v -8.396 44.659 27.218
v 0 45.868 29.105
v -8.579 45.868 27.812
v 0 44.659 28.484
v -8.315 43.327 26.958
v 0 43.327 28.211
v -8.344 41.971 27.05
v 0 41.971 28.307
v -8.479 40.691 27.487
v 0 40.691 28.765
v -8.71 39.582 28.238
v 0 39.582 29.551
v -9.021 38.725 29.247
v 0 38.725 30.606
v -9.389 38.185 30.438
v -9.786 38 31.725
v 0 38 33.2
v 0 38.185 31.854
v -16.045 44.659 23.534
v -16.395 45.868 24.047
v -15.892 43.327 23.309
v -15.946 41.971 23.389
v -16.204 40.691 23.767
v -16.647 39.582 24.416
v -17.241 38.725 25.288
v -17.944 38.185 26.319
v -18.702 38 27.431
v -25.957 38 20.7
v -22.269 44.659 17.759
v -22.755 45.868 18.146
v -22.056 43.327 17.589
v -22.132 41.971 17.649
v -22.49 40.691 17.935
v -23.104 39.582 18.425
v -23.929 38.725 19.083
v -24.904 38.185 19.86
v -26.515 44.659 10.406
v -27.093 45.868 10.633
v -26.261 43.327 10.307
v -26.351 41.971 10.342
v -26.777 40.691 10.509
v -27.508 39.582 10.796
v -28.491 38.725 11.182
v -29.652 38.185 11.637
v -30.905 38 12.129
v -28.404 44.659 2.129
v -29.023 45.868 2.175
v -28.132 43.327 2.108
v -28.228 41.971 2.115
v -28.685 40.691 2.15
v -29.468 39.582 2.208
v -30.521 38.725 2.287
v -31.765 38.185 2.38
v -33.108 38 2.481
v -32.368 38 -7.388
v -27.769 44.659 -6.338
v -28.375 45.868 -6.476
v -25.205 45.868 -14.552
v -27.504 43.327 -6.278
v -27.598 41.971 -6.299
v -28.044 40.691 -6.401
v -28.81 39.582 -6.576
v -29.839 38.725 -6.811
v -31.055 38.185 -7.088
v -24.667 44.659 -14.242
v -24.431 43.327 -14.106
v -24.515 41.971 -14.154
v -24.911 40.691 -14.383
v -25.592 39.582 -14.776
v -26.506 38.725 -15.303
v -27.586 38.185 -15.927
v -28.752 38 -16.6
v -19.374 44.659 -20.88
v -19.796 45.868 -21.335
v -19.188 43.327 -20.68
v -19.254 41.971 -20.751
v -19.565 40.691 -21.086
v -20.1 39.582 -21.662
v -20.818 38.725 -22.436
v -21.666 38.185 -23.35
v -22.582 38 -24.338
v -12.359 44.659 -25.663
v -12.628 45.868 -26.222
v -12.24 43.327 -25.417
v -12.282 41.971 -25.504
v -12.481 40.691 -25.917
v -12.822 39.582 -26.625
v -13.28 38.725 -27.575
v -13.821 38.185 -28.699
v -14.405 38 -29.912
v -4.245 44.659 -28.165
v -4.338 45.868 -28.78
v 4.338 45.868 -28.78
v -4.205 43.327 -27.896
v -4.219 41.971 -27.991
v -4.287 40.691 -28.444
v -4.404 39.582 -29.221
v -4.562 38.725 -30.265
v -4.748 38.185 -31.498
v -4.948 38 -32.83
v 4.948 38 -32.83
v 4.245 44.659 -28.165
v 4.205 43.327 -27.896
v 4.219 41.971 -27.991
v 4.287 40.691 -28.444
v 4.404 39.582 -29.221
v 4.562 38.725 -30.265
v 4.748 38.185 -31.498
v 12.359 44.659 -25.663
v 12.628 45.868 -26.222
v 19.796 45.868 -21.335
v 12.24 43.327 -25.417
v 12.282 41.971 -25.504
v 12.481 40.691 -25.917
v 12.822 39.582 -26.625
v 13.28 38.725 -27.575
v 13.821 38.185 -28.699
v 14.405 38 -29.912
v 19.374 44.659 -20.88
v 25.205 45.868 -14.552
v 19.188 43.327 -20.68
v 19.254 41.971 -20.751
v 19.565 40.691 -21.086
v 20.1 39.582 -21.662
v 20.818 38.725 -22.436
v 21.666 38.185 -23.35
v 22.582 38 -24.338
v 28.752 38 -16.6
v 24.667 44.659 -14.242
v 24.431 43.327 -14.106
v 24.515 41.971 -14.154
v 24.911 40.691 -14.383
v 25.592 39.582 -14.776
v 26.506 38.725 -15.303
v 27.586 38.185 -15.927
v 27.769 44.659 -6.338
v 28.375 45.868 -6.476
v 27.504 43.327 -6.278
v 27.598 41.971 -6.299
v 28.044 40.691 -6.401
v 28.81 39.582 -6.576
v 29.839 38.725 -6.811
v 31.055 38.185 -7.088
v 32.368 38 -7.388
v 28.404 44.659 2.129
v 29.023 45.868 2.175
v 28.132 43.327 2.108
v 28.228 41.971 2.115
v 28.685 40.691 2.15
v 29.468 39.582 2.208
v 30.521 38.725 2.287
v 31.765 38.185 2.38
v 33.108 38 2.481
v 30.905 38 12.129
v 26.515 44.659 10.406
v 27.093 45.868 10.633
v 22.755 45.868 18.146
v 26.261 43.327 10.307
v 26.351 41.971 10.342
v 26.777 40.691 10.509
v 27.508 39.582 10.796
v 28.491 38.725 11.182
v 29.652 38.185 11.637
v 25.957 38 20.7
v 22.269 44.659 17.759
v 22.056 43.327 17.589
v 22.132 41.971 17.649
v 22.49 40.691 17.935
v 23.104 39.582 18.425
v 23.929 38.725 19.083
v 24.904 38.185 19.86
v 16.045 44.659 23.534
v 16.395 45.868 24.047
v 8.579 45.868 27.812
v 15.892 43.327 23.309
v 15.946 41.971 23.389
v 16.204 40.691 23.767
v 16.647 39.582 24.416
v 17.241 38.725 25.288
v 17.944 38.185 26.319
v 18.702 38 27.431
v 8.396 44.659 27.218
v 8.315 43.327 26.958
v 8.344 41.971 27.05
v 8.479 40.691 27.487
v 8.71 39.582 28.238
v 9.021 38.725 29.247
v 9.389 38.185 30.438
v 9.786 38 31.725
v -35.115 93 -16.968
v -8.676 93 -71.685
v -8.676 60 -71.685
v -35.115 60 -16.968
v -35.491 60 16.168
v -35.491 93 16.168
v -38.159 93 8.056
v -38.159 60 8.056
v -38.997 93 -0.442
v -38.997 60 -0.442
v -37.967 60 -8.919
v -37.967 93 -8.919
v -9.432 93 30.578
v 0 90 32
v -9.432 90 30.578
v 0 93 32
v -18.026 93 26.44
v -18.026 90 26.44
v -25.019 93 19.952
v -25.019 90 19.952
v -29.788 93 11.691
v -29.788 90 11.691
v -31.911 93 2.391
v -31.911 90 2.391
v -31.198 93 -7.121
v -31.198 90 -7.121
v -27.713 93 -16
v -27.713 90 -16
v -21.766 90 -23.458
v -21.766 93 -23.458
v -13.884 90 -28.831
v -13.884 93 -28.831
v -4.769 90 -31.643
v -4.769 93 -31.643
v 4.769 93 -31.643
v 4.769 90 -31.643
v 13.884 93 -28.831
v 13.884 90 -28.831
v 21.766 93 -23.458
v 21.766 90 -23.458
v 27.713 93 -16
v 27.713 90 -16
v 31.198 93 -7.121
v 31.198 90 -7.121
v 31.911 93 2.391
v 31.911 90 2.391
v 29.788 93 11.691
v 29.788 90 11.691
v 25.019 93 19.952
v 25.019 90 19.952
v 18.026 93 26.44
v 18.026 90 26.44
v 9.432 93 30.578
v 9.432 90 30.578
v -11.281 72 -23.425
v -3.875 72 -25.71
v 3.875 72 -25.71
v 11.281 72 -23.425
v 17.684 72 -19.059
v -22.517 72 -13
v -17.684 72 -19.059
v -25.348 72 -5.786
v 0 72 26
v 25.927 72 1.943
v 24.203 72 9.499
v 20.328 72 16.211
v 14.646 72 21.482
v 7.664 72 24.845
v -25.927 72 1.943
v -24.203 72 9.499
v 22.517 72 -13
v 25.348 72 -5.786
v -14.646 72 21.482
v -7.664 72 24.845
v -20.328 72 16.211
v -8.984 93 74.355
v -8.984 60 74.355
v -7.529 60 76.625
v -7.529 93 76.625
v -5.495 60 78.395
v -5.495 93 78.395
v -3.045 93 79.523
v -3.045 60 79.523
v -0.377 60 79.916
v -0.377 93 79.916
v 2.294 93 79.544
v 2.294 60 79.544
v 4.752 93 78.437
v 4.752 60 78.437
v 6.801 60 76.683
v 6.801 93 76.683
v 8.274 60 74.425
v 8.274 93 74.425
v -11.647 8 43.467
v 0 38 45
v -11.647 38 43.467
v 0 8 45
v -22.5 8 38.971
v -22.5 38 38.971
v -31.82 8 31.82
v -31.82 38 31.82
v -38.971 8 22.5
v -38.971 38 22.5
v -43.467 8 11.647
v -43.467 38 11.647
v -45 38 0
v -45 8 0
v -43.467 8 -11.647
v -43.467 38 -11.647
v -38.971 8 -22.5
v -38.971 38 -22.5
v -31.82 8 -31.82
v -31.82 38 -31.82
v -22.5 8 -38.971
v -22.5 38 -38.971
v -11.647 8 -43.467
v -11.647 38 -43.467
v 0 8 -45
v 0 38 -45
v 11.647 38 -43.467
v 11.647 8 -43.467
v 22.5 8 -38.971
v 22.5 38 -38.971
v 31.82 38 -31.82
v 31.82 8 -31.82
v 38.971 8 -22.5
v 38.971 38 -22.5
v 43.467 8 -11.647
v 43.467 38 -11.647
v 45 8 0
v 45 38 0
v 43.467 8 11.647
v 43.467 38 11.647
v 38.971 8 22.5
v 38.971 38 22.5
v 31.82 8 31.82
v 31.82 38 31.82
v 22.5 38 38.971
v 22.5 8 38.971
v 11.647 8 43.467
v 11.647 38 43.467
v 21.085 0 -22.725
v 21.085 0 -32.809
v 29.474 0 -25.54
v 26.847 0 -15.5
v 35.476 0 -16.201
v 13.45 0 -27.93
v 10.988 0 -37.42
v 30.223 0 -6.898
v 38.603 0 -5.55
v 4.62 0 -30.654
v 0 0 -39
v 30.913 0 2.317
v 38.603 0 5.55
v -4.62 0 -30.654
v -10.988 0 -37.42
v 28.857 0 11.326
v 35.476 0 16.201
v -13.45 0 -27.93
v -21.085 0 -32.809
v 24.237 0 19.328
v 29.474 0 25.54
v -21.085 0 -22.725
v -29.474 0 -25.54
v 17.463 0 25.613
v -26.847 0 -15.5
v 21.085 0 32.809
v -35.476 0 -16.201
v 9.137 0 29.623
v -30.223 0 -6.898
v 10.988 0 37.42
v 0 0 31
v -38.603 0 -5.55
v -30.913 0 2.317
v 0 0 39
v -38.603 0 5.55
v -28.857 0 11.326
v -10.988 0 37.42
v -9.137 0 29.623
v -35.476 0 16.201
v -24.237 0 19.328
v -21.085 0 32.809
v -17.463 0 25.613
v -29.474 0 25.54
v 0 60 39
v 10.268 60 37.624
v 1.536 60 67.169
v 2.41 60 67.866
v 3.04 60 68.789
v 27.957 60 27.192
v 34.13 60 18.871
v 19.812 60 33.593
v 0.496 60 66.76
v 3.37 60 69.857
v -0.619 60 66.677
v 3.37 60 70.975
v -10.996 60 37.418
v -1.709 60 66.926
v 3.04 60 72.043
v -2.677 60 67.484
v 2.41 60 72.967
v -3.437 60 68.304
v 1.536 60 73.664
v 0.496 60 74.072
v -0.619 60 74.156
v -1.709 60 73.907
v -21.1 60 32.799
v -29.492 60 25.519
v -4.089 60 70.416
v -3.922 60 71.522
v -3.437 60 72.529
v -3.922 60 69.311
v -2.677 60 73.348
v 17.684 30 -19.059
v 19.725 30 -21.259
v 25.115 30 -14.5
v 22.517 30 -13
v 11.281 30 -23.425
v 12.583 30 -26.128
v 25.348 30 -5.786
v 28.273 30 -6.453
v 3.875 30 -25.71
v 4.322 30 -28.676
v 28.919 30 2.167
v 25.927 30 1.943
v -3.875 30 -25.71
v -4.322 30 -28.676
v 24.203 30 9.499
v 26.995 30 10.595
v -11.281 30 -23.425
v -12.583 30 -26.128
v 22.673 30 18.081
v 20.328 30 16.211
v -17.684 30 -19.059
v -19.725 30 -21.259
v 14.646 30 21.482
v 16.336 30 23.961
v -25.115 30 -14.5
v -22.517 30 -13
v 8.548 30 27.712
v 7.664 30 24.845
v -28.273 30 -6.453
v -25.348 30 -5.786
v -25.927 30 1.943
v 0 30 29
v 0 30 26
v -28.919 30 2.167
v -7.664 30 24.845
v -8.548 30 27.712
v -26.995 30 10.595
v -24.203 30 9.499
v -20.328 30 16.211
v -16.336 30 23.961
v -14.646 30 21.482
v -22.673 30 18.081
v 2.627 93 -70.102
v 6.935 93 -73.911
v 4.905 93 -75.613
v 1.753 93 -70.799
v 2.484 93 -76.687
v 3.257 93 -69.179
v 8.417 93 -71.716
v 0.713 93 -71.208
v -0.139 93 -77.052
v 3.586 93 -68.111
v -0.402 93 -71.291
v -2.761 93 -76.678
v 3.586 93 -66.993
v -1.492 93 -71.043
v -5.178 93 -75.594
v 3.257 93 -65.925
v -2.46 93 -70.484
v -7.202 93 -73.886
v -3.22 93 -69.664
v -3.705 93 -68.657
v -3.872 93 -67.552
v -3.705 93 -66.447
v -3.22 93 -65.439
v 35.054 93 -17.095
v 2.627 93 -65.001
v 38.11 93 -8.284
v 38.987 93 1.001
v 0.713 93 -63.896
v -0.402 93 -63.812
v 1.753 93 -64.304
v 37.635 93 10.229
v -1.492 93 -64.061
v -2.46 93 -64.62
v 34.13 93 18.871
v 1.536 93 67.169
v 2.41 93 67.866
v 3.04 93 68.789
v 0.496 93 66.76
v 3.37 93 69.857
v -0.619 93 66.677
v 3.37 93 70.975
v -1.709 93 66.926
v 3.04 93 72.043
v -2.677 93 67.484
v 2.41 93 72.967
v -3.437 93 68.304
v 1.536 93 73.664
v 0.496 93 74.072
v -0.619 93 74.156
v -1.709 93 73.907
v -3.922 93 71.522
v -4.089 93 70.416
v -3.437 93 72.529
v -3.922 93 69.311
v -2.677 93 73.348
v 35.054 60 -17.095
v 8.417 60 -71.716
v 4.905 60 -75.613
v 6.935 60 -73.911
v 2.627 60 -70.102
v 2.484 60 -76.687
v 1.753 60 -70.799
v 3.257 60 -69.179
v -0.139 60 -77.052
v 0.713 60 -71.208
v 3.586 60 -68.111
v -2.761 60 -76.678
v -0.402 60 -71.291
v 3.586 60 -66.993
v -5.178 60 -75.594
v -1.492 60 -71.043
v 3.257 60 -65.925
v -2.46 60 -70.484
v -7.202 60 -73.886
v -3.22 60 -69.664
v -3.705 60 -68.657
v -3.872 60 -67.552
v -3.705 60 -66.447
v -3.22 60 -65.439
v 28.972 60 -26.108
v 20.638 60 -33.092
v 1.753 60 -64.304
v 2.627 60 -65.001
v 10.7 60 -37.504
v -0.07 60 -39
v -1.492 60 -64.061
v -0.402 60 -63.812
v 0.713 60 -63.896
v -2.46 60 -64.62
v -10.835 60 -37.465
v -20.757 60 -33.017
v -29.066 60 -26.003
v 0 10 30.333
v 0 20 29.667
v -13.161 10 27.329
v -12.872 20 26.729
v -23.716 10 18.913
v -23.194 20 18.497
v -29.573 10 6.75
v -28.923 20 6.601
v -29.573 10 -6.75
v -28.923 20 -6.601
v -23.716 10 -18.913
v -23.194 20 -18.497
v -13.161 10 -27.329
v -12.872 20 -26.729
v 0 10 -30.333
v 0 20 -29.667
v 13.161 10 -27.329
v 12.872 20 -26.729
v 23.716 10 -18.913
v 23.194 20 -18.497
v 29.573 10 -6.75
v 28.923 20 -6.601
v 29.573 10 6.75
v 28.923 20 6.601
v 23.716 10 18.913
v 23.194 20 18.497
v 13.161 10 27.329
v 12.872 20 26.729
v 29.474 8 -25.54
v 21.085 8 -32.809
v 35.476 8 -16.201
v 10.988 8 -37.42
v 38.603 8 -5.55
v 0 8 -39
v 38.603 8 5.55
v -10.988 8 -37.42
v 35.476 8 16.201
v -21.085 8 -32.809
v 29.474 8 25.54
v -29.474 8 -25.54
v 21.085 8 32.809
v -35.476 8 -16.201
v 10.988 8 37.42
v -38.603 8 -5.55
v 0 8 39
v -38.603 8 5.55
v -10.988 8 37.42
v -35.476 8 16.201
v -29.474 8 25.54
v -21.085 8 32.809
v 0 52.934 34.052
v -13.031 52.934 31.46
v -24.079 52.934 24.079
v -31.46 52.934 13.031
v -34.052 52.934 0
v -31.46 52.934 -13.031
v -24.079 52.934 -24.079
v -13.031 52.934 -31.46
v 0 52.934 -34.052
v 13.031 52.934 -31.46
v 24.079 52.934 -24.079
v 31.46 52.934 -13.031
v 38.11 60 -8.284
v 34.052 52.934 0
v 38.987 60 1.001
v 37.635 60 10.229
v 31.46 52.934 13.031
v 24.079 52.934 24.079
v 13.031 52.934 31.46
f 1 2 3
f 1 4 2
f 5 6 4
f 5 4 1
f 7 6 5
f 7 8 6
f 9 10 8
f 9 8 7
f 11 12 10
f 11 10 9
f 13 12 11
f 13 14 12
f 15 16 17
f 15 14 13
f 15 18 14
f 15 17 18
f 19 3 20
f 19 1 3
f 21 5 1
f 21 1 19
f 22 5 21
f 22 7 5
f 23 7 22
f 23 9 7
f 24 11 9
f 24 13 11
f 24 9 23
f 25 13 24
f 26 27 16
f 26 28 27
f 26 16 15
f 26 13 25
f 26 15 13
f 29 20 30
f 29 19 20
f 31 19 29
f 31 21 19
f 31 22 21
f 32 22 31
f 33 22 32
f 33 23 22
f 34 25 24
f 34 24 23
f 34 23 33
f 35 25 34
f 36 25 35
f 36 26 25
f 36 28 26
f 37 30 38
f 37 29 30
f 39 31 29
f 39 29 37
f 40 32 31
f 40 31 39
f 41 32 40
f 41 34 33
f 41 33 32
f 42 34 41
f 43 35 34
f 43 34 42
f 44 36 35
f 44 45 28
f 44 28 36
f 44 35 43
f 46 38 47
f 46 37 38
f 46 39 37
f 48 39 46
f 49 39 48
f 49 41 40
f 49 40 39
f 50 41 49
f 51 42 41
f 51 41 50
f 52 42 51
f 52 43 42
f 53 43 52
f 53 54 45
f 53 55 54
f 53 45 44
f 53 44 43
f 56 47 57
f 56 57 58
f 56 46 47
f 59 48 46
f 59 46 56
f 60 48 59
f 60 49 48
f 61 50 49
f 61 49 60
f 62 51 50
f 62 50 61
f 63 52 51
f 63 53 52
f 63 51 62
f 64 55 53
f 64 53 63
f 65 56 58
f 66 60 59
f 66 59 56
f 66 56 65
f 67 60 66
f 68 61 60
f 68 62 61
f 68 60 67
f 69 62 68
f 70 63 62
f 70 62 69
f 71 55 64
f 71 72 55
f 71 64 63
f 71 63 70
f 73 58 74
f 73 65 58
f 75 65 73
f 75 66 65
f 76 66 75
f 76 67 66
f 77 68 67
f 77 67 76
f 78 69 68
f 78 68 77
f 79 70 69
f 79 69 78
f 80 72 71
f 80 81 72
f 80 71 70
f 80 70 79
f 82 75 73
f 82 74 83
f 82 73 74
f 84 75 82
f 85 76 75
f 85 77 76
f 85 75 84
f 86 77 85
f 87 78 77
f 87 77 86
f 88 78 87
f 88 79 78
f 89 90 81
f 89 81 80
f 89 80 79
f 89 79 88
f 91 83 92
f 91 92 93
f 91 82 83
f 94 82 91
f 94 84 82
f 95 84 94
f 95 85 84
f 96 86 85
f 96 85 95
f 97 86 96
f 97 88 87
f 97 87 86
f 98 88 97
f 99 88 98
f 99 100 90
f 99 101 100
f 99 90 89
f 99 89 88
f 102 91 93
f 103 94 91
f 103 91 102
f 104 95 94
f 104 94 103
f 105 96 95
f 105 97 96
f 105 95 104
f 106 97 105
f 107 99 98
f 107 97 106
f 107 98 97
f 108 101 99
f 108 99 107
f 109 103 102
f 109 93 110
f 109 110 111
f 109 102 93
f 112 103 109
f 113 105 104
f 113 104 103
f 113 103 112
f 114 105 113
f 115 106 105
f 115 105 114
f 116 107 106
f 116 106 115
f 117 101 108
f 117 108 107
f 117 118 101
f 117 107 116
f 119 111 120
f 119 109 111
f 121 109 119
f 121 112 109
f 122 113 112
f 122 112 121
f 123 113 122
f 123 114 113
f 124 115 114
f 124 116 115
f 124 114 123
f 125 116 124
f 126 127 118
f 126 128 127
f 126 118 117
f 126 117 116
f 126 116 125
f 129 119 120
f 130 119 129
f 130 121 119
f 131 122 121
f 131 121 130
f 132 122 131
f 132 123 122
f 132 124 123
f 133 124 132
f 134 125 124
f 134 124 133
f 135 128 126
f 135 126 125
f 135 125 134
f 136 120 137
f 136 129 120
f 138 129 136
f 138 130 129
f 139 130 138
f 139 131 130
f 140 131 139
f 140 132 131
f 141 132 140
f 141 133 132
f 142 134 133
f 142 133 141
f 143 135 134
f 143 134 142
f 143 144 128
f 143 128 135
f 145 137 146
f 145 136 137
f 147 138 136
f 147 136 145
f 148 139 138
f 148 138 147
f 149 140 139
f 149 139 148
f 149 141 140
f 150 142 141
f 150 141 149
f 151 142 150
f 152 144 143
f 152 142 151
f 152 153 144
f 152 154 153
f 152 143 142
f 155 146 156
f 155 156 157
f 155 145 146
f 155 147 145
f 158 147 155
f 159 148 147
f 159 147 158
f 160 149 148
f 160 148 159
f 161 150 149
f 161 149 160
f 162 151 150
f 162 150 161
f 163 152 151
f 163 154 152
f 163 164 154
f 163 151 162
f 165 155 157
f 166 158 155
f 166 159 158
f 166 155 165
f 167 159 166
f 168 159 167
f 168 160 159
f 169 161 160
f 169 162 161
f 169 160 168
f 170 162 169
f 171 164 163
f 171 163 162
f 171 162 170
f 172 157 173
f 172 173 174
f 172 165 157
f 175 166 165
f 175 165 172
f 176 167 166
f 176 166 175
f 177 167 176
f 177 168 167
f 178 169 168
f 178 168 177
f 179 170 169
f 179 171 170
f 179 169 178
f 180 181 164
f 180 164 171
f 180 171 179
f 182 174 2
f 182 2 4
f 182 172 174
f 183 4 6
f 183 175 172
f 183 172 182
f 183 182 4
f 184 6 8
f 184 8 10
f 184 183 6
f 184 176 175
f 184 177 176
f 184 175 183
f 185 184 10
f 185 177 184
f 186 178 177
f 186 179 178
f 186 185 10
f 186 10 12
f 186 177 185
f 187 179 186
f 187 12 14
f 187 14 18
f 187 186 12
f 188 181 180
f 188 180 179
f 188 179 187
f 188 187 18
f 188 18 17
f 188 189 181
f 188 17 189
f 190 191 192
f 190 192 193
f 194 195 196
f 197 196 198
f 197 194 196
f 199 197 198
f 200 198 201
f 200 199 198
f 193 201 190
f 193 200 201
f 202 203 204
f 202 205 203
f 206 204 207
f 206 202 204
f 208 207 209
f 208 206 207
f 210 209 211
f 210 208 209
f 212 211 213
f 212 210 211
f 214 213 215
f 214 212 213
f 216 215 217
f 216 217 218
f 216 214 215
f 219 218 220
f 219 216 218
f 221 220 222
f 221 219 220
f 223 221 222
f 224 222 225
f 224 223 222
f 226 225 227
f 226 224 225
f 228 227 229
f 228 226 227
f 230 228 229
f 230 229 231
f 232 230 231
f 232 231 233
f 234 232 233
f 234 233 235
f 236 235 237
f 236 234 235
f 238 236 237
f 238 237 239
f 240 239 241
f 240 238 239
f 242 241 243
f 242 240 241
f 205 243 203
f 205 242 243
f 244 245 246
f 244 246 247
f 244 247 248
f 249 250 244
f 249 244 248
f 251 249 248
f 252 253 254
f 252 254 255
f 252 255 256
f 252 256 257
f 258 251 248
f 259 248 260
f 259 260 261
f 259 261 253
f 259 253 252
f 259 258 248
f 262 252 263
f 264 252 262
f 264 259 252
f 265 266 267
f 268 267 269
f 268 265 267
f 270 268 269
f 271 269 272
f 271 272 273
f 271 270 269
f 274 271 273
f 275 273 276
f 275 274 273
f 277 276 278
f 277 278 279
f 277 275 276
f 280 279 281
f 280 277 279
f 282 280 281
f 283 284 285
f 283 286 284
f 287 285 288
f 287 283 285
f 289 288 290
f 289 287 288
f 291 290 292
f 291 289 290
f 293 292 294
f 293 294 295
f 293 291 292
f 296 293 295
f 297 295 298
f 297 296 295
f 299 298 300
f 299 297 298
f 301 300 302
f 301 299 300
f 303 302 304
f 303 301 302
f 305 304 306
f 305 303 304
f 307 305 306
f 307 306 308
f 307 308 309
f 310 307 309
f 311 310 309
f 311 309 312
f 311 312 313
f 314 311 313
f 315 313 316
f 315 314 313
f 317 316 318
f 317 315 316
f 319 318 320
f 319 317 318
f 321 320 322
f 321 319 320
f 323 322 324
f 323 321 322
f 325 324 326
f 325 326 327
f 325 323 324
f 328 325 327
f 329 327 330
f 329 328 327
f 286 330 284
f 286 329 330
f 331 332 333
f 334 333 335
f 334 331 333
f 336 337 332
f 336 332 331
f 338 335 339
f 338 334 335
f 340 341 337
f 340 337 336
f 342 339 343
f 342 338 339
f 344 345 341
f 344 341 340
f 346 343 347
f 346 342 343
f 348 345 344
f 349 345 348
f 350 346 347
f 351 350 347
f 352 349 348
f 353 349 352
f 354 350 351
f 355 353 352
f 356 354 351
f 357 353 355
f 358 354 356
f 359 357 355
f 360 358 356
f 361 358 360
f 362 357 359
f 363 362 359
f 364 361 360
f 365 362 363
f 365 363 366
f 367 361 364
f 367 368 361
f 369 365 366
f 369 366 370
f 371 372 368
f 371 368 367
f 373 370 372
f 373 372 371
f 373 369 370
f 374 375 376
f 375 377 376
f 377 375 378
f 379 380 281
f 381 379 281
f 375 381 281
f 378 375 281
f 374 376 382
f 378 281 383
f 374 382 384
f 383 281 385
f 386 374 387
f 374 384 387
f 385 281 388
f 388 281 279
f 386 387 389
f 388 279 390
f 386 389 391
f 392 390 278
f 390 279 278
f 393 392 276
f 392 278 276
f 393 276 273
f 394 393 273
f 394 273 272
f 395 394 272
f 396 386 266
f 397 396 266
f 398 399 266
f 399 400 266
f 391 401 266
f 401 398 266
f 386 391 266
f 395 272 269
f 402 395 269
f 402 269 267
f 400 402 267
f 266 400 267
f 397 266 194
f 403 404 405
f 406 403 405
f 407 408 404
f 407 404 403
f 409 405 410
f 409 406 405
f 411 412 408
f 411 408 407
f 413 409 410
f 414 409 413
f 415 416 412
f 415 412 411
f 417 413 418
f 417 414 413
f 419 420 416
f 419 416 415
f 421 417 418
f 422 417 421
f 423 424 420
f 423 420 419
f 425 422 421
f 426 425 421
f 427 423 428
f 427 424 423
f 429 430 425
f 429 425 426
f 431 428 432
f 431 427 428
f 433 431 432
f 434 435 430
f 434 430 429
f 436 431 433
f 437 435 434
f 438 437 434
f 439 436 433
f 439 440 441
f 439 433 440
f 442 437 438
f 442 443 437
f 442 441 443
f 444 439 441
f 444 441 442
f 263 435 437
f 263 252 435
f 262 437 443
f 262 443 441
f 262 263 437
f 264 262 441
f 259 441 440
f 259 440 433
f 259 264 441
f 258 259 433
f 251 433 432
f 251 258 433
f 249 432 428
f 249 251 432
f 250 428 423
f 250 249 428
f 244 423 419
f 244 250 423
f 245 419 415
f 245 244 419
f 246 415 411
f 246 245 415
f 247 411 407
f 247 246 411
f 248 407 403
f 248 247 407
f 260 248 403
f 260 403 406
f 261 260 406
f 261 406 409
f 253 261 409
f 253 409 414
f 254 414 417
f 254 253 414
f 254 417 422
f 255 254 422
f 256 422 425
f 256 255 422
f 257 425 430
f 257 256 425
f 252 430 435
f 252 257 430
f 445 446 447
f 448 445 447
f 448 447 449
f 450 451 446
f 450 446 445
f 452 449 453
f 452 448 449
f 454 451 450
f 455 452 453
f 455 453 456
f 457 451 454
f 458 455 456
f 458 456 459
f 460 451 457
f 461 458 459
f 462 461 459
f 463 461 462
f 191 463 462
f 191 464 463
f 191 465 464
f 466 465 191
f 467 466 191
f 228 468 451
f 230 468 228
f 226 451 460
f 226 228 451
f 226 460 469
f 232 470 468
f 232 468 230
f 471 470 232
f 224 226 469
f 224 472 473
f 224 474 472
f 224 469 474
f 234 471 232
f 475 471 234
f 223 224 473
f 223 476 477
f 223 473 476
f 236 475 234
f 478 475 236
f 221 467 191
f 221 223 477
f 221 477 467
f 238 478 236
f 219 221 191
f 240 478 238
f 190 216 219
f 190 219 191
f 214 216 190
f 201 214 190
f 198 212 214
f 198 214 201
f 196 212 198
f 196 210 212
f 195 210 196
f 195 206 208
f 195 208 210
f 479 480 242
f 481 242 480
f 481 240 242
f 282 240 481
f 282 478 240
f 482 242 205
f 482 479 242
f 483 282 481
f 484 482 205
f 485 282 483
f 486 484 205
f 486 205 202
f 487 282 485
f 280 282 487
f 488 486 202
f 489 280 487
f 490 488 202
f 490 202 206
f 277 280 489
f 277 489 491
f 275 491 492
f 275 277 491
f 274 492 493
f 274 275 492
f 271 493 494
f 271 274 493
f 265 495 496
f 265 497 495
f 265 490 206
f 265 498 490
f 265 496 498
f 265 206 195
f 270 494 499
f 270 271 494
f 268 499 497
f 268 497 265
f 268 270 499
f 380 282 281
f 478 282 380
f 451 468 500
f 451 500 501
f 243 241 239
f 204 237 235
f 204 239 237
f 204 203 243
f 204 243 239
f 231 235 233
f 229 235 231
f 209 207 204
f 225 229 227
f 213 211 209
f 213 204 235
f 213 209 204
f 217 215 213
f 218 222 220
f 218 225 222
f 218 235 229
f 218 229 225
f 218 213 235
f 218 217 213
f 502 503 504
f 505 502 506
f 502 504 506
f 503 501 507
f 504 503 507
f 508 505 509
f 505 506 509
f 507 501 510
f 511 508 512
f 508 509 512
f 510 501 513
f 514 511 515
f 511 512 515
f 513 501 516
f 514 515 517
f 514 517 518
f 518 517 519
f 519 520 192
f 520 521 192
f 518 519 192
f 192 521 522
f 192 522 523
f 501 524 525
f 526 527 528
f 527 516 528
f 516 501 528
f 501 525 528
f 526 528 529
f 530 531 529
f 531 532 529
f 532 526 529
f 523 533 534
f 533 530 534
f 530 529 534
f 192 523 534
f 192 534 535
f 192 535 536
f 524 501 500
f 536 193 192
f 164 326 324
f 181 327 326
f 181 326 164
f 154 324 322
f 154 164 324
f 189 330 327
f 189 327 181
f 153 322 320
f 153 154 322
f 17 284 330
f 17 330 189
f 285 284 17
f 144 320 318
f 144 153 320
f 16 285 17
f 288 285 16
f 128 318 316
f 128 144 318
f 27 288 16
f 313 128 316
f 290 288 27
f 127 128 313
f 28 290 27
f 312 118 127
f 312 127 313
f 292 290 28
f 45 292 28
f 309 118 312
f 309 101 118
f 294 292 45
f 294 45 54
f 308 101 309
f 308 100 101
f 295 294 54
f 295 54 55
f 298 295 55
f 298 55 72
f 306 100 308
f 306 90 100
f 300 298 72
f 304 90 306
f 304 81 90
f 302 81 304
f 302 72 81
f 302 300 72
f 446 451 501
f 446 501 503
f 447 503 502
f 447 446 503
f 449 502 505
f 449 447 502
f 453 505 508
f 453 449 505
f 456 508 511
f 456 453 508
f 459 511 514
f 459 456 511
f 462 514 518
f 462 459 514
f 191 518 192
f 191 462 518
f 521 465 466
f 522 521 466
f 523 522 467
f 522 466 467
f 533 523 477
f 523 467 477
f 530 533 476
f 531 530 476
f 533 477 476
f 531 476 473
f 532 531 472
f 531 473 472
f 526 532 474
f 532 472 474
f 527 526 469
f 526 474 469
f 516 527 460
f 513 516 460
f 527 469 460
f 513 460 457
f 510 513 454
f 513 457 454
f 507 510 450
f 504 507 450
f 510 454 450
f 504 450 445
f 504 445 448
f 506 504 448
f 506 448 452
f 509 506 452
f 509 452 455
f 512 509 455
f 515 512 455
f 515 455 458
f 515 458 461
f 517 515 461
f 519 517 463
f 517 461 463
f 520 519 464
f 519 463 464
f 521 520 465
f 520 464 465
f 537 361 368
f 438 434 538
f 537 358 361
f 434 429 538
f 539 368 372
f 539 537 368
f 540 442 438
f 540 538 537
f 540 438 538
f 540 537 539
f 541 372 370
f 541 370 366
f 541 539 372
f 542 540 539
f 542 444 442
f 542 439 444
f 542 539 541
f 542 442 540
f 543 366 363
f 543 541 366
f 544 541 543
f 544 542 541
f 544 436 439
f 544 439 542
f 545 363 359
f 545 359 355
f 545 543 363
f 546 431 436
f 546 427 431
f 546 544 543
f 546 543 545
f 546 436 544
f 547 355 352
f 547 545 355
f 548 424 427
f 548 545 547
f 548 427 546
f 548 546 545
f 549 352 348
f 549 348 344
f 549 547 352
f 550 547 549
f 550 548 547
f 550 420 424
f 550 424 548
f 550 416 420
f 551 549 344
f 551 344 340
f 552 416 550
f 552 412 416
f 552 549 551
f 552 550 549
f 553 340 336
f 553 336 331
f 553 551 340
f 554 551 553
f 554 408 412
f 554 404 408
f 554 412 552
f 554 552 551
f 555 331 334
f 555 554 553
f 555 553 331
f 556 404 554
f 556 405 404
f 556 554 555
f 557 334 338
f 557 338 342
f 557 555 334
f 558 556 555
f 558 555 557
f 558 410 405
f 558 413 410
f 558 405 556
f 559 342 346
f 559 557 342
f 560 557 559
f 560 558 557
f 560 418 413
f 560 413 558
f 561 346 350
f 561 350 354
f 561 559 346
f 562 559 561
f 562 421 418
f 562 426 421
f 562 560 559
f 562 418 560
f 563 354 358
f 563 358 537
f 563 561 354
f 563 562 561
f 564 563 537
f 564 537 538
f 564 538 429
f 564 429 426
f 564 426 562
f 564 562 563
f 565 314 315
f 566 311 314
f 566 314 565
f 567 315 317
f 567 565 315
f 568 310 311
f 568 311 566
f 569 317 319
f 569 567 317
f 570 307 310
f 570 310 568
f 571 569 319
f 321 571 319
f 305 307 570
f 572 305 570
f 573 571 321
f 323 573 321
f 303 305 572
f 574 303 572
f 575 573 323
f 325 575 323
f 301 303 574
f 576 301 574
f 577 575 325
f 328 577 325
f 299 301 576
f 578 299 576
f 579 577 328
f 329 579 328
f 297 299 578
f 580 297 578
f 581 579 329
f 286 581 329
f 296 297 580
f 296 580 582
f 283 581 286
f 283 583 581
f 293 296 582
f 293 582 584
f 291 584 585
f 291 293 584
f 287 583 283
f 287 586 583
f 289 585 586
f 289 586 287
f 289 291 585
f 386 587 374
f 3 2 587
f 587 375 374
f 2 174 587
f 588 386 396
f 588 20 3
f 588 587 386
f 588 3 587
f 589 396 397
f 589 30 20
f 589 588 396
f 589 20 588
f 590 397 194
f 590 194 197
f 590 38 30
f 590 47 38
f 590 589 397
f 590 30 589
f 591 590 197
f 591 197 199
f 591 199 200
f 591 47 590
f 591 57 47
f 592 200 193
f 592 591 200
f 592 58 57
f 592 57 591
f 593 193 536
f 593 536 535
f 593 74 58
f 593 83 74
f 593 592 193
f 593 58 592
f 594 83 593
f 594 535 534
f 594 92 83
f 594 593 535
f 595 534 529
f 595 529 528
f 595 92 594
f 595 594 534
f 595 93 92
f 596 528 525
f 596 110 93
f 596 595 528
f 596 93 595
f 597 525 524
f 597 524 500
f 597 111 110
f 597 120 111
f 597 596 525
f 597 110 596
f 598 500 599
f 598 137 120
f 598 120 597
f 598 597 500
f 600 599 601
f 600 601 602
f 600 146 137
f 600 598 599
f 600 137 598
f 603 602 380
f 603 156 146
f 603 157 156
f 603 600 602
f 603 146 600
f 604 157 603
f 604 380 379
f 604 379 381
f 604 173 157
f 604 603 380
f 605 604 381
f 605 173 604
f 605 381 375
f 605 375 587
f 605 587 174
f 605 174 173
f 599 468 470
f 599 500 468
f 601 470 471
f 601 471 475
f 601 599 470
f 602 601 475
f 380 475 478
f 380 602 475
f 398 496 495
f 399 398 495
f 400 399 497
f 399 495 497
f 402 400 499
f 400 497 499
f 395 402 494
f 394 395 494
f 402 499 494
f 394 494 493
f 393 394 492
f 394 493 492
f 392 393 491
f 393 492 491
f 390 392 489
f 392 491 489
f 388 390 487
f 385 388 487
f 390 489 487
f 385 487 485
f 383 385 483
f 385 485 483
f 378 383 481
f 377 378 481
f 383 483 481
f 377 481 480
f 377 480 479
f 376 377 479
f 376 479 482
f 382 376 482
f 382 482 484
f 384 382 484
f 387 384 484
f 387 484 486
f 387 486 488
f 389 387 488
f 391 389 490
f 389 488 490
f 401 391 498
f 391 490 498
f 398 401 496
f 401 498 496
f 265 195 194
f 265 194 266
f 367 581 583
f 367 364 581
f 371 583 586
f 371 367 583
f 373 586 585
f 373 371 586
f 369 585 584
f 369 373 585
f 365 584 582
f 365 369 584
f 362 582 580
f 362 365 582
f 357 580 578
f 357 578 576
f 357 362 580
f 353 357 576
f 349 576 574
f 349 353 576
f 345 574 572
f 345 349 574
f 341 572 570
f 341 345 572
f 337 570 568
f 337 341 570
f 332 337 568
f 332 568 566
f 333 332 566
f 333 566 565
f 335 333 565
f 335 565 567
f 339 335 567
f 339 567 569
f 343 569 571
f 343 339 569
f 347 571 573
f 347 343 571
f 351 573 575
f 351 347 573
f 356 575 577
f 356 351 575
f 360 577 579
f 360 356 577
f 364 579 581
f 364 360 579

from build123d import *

# Parameters (mm, degrees)
F2_R     = 3.75
F3_DEPTH = 33


with BuildPart() as f1:
    # F0 (on Right) → F1 (revolve)
    with BuildSketch(Plane.YZ):
        with BuildLine():
            Line((38, 45), (8, 45))
            Line((8, 45), (8, 39))
            Line((8, 39), (0, 39))
            Line((0, 39), (0, 31))
            Line((0, 31), (30, 29))
            Line((30, 29), (30, 26))
            Line((30, 26), (72, 26))
            Line((72, 26), (72, 0))
            Line((72, 0), (90, 0))
            Line((90, 0), (90, 32))
            Line((90, 32), (93, 32))
            Line((93, 32), (93, 39))
            Line((93, 39), (60, 39))
            Line((60, 39), (45.8678821818, 29.1045845728))
            ThreePointArc((45.8678821818, 29.1045845728), (40.6912569338, 28.7652906284), (38, 33.2003447942))
            Line((38, 33.2003447942), (38, 45))
        make_face()
    revolve(axis=Axis((0, 81, 0), (0, -1, 0)))

    # F2 (on face) → F3 (join)
    with BuildSketch(Plane(origin=(0, 93, 0), x_dir=(-1, 0, 0), z_dir=(0, 1, 0))):
        with BuildLine():
            Line((-8.2742985586, 74.4249113641), (-34.130188626, 18.8714128871))
            ThreePointArc((-34.130188626, 18.8714128871), (1.513291562, 38.9706293078), (35.4908216229, 16.1679182498))
            Line((35.4908216229, 16.1679182498), (8.9837408504, 74.3546347403))
            ThreePointArc((8.9837408504, 74.3546347403), (0.3772254297, 79.9162169156), (-8.2742985586, 74.4249113641))
        make_face()
        with Locations((0.3385407115, 70.4162956794)):
            Circle(F2_R, mode=Mode.SUBTRACT)
        with BuildLine():
            Line((-35.0538594373, -17.094646488), (-8.4168125088, -71.7159163408))
            ThreePointArc((-8.4168125088, -71.7159163408), (0.1390979946, -77.0518203061), (8.6756874862, -71.6850600617))
            Line((8.6756874862, -71.6850600617), (35.1153510684, -16.9679733422))
            ThreePointArc((35.1153510684, -16.9679733422), (0.0704047345, -38.9999364509), (-35.0538594373, -17.094646488))
        make_face()
        with Locations((0.1219481234, -67.551835786)):
            Circle(F2_R, mode=Mode.SUBTRACT)
    extrude(amount=-F3_DEPTH)


solid = f1.part
